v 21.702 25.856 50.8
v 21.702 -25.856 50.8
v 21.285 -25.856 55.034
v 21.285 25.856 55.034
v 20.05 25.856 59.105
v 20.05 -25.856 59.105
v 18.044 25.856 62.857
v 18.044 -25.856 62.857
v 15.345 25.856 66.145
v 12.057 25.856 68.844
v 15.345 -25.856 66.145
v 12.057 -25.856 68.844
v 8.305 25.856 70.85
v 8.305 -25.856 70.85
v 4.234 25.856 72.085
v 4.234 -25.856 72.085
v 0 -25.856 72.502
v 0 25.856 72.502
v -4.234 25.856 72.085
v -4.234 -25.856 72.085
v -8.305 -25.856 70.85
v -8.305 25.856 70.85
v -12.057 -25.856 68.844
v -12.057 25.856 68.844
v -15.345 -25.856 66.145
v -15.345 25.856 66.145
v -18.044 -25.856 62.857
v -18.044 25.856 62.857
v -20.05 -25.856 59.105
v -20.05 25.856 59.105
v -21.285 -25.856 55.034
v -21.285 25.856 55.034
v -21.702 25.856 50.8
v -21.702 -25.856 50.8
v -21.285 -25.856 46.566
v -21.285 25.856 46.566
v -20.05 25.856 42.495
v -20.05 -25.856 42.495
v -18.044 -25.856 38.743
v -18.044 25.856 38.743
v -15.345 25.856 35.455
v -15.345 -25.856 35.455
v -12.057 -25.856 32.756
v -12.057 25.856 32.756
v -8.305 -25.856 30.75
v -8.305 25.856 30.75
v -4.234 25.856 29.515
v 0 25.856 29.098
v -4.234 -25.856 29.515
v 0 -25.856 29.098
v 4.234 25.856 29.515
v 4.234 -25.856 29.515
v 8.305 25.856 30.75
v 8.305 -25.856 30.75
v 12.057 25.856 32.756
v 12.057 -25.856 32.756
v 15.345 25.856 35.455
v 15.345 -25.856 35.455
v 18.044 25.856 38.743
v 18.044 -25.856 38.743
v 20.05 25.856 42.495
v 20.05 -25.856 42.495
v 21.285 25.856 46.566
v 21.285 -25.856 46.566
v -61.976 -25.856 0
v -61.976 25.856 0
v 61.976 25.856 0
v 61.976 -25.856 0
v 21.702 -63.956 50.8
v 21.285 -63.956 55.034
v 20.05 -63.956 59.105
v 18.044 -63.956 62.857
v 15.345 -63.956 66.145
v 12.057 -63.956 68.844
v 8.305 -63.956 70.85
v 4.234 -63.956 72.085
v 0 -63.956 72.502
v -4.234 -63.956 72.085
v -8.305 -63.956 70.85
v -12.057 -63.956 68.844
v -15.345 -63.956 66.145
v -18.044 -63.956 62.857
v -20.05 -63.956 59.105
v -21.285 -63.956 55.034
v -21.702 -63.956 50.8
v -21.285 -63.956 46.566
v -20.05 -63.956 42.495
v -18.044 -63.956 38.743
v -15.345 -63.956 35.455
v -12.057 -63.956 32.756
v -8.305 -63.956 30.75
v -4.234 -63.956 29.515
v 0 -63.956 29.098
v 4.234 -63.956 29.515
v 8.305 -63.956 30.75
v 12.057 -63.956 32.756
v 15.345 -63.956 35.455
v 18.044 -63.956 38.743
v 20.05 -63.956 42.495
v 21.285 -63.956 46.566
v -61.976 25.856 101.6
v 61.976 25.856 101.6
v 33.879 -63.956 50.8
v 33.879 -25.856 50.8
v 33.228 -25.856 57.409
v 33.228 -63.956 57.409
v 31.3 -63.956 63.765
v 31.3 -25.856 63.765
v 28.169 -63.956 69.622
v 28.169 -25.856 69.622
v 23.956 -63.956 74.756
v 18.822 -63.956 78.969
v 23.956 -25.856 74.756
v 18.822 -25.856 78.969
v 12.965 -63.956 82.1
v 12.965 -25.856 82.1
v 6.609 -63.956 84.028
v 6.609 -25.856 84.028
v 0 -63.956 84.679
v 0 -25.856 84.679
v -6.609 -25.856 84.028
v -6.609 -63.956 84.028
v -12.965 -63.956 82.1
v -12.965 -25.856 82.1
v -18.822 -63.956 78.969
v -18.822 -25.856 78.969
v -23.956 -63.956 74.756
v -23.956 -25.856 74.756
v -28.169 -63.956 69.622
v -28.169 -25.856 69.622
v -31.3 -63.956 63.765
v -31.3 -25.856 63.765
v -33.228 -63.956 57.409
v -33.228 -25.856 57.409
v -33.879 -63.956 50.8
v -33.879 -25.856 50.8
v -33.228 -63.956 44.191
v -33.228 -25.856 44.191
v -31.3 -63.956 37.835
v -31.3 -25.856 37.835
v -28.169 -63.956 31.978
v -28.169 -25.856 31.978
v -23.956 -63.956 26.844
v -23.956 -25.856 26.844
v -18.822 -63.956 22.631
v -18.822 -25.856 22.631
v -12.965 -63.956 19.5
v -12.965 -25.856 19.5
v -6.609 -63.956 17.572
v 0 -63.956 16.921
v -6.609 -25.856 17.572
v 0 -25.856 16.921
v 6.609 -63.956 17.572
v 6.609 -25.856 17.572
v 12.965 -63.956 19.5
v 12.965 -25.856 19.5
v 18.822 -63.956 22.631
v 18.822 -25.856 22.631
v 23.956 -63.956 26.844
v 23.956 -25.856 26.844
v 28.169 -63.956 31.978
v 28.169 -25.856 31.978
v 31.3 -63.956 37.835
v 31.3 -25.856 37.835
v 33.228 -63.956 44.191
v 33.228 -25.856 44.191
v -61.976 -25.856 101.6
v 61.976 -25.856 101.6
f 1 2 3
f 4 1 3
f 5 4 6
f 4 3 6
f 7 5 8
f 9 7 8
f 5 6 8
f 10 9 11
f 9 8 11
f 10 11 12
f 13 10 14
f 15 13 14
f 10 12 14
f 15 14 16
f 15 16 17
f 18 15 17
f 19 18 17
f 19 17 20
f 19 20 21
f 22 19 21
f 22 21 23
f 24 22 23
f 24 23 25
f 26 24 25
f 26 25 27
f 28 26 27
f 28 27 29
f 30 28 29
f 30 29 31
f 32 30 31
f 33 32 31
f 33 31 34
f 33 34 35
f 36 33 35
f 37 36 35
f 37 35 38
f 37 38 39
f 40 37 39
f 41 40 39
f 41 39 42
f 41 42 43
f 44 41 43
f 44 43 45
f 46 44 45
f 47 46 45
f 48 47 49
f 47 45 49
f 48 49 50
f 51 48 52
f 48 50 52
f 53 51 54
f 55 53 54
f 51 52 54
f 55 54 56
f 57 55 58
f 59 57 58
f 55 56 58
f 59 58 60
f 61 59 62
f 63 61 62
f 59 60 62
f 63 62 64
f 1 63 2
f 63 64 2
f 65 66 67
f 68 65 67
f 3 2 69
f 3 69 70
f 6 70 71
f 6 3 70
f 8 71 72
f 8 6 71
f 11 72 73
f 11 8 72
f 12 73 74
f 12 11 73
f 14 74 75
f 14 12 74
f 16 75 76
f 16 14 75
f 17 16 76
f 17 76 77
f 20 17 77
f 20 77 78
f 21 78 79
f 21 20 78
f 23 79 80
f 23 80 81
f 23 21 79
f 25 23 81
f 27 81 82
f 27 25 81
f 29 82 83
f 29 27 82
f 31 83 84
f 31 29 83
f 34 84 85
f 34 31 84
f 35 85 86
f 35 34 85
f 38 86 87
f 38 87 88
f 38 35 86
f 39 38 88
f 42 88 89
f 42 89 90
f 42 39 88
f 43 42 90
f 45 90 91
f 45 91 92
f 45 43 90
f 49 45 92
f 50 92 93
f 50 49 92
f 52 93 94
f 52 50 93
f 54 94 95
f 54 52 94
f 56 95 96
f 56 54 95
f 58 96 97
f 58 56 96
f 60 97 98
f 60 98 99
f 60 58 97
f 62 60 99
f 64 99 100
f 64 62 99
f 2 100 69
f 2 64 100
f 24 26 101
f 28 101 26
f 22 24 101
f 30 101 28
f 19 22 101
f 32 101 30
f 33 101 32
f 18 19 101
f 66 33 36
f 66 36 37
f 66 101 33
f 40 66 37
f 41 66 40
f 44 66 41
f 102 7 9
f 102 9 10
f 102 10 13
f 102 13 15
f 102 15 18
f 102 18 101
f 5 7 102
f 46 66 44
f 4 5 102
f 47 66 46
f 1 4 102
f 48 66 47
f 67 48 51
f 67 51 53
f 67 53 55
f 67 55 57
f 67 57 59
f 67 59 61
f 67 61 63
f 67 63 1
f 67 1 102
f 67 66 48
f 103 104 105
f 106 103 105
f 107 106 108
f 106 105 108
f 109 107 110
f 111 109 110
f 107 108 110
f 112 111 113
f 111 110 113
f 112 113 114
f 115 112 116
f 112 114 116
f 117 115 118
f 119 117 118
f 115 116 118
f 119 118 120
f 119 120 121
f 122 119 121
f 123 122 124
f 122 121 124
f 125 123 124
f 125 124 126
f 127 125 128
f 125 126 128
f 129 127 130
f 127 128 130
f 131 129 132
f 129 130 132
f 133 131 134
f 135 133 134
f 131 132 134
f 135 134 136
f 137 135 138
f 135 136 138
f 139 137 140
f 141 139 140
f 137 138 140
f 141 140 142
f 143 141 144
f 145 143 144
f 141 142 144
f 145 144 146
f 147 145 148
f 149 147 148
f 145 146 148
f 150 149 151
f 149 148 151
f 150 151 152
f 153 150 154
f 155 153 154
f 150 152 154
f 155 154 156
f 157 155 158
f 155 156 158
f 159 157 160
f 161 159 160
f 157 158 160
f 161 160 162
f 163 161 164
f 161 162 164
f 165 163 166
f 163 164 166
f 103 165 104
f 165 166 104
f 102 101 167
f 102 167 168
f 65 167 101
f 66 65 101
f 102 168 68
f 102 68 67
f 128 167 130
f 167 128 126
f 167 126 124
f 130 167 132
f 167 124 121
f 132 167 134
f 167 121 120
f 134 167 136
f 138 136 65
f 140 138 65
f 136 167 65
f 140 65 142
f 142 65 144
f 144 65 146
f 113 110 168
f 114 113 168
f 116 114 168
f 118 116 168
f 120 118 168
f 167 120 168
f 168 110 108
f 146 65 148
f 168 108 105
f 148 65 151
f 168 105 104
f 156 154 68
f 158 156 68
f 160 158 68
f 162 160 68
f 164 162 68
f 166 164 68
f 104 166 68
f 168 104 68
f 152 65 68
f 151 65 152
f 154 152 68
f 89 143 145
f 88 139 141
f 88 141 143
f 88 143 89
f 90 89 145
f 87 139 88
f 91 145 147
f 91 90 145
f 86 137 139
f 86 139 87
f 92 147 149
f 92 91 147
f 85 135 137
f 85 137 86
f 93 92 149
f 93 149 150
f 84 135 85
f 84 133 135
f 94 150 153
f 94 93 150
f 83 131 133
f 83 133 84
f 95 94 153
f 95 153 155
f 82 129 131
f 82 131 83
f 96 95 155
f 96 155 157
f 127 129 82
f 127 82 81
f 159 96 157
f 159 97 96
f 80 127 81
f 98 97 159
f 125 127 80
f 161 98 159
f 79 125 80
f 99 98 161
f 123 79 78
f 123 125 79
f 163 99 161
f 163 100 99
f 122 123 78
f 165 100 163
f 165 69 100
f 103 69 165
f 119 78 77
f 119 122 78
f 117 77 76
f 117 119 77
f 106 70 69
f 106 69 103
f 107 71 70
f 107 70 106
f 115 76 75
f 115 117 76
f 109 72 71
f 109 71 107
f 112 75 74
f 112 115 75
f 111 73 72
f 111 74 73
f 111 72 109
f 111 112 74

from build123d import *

# Parameters (mm, degrees)
F0_W      = 123.952538
F0_H      = 51.712212
F1_DEPTH  = 101.6
F2_R      = 33.878602
F2_R_2    = 21.701587
F3_DEPTH  = 38.1
F3_FACE_R = 21.701587
F4_DEPTH  = 2540


with BuildPart() as f1:
    # F0 (on Top) → F1 (new body)
    with BuildSketch(Plane.XY):
        Rectangle(F0_W, F0_H)
    extrude(amount=F1_DEPTH)

    # F2 (on face) → F3 (join)
    with BuildSketch(Plane.XZ.offset(25.856106)):
        with Locations((0, 50.8)):
            Circle(F2_R)
        with Locations((0, 50.8)):
            Circle(F2_R_2, mode=Mode.SUBTRACT)
    extrude(amount=F3_DEPTH)

    # F3_face (on face) → F4 (cut)
    with BuildSketch(Plane(origin=(0, -25.856106, 50.8), x_dir=(1, 0, 0), z_dir=(0, -1, 0))):
        Circle(F3_FACE_R)
    extrude(amount=-F4_DEPTH, mode=Mode.SUBTRACT)


solid = f1.part
